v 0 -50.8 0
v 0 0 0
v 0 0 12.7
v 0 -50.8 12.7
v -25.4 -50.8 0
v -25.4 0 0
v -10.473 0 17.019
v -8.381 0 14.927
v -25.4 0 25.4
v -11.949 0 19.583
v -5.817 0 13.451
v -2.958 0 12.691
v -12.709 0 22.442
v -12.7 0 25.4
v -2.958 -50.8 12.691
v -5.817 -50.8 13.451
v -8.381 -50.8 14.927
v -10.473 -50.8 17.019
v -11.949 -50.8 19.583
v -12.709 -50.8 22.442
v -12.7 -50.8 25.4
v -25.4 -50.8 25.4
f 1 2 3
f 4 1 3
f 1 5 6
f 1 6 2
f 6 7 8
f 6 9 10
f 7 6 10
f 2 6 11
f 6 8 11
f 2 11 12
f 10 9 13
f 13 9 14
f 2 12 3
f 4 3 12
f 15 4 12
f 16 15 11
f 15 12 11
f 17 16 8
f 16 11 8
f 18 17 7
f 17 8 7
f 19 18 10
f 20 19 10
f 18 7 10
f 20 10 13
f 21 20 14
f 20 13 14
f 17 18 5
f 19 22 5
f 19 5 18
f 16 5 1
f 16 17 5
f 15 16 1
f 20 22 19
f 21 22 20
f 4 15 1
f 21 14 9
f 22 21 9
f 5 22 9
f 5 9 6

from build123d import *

# Parameters (mm, degrees)
F1_DEPTH = 50.8


with BuildPart() as f1:
    # F0 (on Front) → F1 (new body)
    with BuildSketch(Plane.XZ):
        with BuildLine():
            Line((-25.4, 0), (0, 0))
            Line((0, 0), (0, 12.7))
            ThreePointArc((0, 12.7), (-9.495563, 15.904437), (-12.7, 25.4))
            Line((-12.7, 25.4), (-25.4, 25.4))
            Line((-25.4, 25.4), (-25.4, 0))
        make_face()
    extrude(amount=F1_DEPTH)


solid = f1.part
